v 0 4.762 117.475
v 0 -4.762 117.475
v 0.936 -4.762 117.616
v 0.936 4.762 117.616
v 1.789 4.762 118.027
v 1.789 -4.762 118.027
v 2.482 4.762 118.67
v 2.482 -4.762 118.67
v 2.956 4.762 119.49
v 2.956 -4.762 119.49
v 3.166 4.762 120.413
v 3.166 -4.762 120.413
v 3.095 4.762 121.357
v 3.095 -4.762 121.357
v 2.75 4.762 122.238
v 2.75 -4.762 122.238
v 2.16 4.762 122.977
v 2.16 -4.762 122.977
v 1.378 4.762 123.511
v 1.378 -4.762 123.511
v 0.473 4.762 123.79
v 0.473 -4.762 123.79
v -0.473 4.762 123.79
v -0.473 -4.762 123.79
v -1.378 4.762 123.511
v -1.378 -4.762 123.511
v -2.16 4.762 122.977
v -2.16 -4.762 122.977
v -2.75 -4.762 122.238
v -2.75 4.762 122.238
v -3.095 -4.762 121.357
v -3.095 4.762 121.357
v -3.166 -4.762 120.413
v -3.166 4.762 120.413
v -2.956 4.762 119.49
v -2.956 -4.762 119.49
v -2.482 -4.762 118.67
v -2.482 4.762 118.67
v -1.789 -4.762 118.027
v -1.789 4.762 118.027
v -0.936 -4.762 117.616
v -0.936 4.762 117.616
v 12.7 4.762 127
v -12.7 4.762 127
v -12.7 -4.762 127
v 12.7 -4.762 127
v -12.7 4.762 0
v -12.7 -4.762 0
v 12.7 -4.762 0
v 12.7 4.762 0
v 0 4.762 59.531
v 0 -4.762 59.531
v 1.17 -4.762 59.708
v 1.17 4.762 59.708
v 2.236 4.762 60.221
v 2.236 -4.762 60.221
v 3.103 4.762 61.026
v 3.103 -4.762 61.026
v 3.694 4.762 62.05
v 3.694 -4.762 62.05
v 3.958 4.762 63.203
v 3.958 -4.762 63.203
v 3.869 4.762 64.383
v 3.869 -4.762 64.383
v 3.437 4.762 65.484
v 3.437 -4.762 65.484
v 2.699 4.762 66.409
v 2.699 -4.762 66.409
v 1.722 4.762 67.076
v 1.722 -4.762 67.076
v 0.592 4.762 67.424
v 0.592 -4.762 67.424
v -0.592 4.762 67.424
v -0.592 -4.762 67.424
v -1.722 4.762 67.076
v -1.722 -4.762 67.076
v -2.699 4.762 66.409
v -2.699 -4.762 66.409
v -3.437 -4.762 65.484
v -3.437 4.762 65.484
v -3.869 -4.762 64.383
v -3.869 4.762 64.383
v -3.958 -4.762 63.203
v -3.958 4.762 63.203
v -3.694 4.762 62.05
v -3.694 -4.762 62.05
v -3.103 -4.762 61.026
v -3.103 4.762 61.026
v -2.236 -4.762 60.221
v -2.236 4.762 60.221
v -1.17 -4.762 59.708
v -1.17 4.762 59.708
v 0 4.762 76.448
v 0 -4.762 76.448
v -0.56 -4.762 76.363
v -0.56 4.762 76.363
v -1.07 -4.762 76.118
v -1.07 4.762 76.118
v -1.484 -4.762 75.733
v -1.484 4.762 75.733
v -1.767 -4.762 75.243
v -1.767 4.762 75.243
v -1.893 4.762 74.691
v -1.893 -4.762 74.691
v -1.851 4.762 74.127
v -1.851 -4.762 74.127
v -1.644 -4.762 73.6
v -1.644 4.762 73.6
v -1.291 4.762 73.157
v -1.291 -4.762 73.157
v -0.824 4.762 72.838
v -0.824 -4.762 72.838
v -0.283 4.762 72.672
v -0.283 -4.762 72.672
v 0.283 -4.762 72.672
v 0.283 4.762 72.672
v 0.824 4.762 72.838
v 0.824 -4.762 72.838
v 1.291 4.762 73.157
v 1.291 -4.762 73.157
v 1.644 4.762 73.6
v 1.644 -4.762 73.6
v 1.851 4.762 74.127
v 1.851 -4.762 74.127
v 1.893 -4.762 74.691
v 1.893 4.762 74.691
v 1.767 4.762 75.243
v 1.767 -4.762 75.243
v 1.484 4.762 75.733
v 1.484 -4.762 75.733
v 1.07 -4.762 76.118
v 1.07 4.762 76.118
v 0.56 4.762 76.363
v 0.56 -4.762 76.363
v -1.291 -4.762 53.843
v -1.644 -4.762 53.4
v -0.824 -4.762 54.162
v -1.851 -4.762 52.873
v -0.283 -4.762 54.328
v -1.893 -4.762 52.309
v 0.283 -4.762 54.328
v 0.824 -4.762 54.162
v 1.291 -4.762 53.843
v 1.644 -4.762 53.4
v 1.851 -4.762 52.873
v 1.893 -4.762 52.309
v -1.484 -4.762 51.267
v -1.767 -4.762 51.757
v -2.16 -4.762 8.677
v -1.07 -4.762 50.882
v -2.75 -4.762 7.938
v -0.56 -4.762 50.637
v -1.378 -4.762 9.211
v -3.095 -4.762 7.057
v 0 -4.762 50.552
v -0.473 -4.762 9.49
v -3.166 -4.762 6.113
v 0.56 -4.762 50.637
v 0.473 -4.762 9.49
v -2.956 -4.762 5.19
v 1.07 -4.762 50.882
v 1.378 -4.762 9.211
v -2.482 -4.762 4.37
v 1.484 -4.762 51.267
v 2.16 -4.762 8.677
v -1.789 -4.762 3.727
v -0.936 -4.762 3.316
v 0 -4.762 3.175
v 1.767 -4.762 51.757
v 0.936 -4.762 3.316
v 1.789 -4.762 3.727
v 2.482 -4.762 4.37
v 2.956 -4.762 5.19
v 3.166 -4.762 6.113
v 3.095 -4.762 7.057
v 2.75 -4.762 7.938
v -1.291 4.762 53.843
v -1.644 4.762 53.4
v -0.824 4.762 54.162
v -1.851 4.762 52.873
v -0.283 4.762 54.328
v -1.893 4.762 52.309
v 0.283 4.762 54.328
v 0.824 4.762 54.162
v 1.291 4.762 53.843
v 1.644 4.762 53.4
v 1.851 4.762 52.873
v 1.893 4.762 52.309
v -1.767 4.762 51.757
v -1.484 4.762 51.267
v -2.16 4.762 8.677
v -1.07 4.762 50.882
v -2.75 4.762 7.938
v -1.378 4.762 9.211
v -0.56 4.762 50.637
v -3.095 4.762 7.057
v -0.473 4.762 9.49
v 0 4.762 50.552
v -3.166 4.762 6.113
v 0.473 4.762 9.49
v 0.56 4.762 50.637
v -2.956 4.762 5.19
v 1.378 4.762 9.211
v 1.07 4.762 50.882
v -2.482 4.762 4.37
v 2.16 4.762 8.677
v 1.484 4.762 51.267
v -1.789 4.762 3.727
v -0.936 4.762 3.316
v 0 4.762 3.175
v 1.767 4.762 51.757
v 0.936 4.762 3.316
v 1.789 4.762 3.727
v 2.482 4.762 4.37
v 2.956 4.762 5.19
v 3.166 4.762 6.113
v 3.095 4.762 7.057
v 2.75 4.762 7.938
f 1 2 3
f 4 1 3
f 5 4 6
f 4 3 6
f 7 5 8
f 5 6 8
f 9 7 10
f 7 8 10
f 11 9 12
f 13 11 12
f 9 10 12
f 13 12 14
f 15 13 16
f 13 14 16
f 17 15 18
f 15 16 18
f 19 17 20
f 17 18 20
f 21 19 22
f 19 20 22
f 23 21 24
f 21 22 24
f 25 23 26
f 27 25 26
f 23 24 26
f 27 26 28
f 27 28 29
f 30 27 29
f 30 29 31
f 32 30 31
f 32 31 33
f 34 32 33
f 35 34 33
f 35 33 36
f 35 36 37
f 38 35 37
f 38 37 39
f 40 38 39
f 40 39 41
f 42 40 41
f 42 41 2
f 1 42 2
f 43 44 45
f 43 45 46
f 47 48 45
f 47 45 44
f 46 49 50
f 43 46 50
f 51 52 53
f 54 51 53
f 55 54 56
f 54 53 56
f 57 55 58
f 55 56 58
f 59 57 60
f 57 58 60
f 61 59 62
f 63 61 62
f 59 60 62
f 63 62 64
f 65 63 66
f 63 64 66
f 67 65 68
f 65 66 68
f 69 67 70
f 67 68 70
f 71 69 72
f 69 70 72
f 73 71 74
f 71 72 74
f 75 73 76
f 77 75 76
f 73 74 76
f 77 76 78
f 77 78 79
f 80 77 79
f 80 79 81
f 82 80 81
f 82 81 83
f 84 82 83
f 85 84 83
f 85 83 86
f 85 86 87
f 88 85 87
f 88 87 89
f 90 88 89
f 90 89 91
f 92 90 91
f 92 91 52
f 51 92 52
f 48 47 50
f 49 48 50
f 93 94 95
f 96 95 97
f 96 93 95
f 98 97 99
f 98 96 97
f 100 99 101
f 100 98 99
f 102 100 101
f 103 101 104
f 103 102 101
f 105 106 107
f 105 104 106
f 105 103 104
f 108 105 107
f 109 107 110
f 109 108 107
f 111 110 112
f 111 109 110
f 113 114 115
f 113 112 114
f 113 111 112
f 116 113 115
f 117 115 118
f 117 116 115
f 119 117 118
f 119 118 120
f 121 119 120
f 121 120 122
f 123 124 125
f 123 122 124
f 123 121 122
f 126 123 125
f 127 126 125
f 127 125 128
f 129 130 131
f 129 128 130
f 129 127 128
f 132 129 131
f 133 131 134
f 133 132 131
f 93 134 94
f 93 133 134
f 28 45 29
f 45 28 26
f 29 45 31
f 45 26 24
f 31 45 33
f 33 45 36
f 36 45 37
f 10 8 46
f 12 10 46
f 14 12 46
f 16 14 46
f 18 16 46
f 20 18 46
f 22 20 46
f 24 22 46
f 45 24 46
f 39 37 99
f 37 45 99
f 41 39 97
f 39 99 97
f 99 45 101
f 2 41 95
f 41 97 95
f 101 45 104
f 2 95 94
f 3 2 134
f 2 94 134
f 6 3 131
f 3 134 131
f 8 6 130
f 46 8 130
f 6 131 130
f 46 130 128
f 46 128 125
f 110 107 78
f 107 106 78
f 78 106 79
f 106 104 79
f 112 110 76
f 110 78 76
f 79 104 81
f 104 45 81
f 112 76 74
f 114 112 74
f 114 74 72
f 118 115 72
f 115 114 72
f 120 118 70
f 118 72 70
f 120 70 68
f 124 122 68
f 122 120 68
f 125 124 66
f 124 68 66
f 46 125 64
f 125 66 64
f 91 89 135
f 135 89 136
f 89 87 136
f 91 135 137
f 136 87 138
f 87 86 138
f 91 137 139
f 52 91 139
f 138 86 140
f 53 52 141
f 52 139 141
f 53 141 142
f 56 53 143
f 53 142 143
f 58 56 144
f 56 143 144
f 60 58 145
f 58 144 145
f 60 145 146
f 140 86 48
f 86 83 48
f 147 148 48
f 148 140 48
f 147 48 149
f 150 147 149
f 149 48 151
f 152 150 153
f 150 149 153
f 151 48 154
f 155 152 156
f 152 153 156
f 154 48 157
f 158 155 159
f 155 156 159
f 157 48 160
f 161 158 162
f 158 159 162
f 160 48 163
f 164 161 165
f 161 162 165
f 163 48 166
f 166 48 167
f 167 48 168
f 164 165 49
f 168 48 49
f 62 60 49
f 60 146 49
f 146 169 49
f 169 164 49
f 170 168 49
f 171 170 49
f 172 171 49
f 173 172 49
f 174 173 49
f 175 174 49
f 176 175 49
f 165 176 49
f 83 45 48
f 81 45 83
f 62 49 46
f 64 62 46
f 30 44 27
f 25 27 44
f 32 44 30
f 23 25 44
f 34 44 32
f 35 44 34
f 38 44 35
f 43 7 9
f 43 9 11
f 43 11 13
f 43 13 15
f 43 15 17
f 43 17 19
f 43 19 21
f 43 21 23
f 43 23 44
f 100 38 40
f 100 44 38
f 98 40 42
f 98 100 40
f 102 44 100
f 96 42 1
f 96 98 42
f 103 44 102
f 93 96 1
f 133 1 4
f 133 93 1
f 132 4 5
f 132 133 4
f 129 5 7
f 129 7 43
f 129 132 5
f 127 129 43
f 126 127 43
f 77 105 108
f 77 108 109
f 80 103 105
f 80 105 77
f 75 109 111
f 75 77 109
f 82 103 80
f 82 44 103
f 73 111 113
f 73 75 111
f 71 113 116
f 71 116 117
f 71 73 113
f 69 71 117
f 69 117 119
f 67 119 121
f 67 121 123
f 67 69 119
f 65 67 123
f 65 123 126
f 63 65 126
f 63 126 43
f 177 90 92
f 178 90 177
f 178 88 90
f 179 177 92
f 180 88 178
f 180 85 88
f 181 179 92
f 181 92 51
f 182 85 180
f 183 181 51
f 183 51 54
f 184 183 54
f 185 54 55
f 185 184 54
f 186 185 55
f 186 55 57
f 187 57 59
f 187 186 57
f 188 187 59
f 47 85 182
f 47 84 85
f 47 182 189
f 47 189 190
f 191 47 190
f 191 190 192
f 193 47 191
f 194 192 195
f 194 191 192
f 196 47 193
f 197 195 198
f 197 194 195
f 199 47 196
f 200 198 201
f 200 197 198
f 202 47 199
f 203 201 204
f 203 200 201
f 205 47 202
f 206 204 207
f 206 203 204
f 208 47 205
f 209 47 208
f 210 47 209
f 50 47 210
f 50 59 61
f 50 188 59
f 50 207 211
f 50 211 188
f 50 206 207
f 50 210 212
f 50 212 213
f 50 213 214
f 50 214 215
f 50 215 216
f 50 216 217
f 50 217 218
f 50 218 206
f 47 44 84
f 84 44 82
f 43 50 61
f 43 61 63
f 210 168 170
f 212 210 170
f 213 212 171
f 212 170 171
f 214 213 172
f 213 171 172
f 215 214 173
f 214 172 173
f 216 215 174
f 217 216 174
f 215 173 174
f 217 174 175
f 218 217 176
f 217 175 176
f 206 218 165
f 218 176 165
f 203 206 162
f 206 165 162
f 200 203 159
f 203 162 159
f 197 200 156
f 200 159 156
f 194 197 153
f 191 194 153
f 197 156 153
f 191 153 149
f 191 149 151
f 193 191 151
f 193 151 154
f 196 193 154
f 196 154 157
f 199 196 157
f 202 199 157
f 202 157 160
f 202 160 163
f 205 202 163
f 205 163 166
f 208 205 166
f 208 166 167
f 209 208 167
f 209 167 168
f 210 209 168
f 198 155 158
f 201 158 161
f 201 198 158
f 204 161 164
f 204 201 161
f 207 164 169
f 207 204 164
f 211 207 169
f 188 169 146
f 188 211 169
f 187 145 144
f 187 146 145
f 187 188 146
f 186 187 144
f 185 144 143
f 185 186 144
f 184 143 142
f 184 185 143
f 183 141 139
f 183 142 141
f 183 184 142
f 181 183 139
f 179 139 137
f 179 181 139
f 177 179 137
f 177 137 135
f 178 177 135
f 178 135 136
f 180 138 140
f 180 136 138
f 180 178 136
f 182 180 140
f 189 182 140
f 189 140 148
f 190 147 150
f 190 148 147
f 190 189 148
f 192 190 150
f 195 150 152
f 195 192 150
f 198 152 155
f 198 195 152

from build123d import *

# Parameters (mm, degrees)
SKETCH1_W                          = 25.4
SKETCH1_H                          = 9.525
EXTRUDE1_DEPTH                     = 127
F_1_4_0_25_DIAMETER_HOLE1_D        = 6.35
F_1_4_0_25_DIAMETER_HOLE1_DEPTH    = 12.7
F_1_4_0_25_DIAMETER_HOLE1_TIP      = 1.907732465
F_5_16_0_3125_DIAMETER_HOLE1_D     = 7.9375
F_5_16_0_3125_DIAMETER_HOLE1_DEPTH = 12.7
F_5_16_0_3125_DIAMETER_HOLE1_TIP   = 2.384665582
CIRPATTERN1_COUNT                  = 2


with BuildPart() as part:
    # Sketch1 → Extrude1 (new body)
    with BuildSketch(Plane.XY):
        Rectangle(SKETCH1_W, SKETCH1_H)
    extrude(amount=EXTRUDE1_DEPTH)

    # 1/4 (0.25) Diameter Hole1
    with Locations(Plane(origin=(0, 4.7625, 6.35), x_dir=(0, 0, 1), z_dir=(0, 1, 0))):
        with Locations((0, 0), (114.3, 0)):
            Hole(F_1_4_0_25_DIAMETER_HOLE1_D / 2, depth=F_1_4_0_25_DIAMETER_HOLE1_DEPTH)
            with Locations((0, 0, -(F_1_4_0_25_DIAMETER_HOLE1_DEPTH + F_1_4_0_25_DIAMETER_HOLE1_TIP / 2))):  # 118° drill point
                Cone(0, F_1_4_0_25_DIAMETER_HOLE1_D / 2, F_1_4_0_25_DIAMETER_HOLE1_TIP, mode=Mode.SUBTRACT)

    # 5/16 (0.3125) Diameter Hole1
    with Locations(Plane(origin=(0, 4.7625, 63.5), x_dir=(0, 0, 1), z_dir=(0, 1, 0))):
        with Locations((0, 0)):
            Hole(F_5_16_0_3125_DIAMETER_HOLE1_D / 2, depth=F_5_16_0_3125_DIAMETER_HOLE1_DEPTH)
            with Locations((0, 0, -(F_5_16_0_3125_DIAMETER_HOLE1_DEPTH + F_5_16_0_3125_DIAMETER_HOLE1_TIP / 2))):  # 118° drill point
                Cone(0, F_5_16_0_3125_DIAMETER_HOLE1_D / 2, F_5_16_0_3125_DIAMETER_HOLE1_TIP, mode=Mode.SUBTRACT)

    # Sketch6 → #25 (0.1495) Diameter Hole1 (revolve, cut)
    with BuildSketch(Plane(origin=(0, 4.7625, 74.549), x_dir=(0, 0, 1), z_dir=(1, 0, 0))):
        Polygon((0, 0), (0, 13.840824014), (1.89865, 12.7), (1.89865, 0), align=None)
    f_25_0_1495_diameter_hole1 = revolve(axis=Axis((0, 11.1125, 74.549), (0, -1, 0)), mode=Mode.SUBTRACT)

    # CirPattern1: #25 (0.1495) Diameter Hole1 ×2 about axis
    cirpattern1_axis = Axis((0, 0, 63.5), (0, 1, 0))
    for i in range(1, CIRPATTERN1_COUNT):
        add(f_25_0_1495_diameter_hole1.rotate(cirpattern1_axis, i * 360 / CIRPATTERN1_COUNT), mode=Mode.SUBTRACT)


solid = part.part
